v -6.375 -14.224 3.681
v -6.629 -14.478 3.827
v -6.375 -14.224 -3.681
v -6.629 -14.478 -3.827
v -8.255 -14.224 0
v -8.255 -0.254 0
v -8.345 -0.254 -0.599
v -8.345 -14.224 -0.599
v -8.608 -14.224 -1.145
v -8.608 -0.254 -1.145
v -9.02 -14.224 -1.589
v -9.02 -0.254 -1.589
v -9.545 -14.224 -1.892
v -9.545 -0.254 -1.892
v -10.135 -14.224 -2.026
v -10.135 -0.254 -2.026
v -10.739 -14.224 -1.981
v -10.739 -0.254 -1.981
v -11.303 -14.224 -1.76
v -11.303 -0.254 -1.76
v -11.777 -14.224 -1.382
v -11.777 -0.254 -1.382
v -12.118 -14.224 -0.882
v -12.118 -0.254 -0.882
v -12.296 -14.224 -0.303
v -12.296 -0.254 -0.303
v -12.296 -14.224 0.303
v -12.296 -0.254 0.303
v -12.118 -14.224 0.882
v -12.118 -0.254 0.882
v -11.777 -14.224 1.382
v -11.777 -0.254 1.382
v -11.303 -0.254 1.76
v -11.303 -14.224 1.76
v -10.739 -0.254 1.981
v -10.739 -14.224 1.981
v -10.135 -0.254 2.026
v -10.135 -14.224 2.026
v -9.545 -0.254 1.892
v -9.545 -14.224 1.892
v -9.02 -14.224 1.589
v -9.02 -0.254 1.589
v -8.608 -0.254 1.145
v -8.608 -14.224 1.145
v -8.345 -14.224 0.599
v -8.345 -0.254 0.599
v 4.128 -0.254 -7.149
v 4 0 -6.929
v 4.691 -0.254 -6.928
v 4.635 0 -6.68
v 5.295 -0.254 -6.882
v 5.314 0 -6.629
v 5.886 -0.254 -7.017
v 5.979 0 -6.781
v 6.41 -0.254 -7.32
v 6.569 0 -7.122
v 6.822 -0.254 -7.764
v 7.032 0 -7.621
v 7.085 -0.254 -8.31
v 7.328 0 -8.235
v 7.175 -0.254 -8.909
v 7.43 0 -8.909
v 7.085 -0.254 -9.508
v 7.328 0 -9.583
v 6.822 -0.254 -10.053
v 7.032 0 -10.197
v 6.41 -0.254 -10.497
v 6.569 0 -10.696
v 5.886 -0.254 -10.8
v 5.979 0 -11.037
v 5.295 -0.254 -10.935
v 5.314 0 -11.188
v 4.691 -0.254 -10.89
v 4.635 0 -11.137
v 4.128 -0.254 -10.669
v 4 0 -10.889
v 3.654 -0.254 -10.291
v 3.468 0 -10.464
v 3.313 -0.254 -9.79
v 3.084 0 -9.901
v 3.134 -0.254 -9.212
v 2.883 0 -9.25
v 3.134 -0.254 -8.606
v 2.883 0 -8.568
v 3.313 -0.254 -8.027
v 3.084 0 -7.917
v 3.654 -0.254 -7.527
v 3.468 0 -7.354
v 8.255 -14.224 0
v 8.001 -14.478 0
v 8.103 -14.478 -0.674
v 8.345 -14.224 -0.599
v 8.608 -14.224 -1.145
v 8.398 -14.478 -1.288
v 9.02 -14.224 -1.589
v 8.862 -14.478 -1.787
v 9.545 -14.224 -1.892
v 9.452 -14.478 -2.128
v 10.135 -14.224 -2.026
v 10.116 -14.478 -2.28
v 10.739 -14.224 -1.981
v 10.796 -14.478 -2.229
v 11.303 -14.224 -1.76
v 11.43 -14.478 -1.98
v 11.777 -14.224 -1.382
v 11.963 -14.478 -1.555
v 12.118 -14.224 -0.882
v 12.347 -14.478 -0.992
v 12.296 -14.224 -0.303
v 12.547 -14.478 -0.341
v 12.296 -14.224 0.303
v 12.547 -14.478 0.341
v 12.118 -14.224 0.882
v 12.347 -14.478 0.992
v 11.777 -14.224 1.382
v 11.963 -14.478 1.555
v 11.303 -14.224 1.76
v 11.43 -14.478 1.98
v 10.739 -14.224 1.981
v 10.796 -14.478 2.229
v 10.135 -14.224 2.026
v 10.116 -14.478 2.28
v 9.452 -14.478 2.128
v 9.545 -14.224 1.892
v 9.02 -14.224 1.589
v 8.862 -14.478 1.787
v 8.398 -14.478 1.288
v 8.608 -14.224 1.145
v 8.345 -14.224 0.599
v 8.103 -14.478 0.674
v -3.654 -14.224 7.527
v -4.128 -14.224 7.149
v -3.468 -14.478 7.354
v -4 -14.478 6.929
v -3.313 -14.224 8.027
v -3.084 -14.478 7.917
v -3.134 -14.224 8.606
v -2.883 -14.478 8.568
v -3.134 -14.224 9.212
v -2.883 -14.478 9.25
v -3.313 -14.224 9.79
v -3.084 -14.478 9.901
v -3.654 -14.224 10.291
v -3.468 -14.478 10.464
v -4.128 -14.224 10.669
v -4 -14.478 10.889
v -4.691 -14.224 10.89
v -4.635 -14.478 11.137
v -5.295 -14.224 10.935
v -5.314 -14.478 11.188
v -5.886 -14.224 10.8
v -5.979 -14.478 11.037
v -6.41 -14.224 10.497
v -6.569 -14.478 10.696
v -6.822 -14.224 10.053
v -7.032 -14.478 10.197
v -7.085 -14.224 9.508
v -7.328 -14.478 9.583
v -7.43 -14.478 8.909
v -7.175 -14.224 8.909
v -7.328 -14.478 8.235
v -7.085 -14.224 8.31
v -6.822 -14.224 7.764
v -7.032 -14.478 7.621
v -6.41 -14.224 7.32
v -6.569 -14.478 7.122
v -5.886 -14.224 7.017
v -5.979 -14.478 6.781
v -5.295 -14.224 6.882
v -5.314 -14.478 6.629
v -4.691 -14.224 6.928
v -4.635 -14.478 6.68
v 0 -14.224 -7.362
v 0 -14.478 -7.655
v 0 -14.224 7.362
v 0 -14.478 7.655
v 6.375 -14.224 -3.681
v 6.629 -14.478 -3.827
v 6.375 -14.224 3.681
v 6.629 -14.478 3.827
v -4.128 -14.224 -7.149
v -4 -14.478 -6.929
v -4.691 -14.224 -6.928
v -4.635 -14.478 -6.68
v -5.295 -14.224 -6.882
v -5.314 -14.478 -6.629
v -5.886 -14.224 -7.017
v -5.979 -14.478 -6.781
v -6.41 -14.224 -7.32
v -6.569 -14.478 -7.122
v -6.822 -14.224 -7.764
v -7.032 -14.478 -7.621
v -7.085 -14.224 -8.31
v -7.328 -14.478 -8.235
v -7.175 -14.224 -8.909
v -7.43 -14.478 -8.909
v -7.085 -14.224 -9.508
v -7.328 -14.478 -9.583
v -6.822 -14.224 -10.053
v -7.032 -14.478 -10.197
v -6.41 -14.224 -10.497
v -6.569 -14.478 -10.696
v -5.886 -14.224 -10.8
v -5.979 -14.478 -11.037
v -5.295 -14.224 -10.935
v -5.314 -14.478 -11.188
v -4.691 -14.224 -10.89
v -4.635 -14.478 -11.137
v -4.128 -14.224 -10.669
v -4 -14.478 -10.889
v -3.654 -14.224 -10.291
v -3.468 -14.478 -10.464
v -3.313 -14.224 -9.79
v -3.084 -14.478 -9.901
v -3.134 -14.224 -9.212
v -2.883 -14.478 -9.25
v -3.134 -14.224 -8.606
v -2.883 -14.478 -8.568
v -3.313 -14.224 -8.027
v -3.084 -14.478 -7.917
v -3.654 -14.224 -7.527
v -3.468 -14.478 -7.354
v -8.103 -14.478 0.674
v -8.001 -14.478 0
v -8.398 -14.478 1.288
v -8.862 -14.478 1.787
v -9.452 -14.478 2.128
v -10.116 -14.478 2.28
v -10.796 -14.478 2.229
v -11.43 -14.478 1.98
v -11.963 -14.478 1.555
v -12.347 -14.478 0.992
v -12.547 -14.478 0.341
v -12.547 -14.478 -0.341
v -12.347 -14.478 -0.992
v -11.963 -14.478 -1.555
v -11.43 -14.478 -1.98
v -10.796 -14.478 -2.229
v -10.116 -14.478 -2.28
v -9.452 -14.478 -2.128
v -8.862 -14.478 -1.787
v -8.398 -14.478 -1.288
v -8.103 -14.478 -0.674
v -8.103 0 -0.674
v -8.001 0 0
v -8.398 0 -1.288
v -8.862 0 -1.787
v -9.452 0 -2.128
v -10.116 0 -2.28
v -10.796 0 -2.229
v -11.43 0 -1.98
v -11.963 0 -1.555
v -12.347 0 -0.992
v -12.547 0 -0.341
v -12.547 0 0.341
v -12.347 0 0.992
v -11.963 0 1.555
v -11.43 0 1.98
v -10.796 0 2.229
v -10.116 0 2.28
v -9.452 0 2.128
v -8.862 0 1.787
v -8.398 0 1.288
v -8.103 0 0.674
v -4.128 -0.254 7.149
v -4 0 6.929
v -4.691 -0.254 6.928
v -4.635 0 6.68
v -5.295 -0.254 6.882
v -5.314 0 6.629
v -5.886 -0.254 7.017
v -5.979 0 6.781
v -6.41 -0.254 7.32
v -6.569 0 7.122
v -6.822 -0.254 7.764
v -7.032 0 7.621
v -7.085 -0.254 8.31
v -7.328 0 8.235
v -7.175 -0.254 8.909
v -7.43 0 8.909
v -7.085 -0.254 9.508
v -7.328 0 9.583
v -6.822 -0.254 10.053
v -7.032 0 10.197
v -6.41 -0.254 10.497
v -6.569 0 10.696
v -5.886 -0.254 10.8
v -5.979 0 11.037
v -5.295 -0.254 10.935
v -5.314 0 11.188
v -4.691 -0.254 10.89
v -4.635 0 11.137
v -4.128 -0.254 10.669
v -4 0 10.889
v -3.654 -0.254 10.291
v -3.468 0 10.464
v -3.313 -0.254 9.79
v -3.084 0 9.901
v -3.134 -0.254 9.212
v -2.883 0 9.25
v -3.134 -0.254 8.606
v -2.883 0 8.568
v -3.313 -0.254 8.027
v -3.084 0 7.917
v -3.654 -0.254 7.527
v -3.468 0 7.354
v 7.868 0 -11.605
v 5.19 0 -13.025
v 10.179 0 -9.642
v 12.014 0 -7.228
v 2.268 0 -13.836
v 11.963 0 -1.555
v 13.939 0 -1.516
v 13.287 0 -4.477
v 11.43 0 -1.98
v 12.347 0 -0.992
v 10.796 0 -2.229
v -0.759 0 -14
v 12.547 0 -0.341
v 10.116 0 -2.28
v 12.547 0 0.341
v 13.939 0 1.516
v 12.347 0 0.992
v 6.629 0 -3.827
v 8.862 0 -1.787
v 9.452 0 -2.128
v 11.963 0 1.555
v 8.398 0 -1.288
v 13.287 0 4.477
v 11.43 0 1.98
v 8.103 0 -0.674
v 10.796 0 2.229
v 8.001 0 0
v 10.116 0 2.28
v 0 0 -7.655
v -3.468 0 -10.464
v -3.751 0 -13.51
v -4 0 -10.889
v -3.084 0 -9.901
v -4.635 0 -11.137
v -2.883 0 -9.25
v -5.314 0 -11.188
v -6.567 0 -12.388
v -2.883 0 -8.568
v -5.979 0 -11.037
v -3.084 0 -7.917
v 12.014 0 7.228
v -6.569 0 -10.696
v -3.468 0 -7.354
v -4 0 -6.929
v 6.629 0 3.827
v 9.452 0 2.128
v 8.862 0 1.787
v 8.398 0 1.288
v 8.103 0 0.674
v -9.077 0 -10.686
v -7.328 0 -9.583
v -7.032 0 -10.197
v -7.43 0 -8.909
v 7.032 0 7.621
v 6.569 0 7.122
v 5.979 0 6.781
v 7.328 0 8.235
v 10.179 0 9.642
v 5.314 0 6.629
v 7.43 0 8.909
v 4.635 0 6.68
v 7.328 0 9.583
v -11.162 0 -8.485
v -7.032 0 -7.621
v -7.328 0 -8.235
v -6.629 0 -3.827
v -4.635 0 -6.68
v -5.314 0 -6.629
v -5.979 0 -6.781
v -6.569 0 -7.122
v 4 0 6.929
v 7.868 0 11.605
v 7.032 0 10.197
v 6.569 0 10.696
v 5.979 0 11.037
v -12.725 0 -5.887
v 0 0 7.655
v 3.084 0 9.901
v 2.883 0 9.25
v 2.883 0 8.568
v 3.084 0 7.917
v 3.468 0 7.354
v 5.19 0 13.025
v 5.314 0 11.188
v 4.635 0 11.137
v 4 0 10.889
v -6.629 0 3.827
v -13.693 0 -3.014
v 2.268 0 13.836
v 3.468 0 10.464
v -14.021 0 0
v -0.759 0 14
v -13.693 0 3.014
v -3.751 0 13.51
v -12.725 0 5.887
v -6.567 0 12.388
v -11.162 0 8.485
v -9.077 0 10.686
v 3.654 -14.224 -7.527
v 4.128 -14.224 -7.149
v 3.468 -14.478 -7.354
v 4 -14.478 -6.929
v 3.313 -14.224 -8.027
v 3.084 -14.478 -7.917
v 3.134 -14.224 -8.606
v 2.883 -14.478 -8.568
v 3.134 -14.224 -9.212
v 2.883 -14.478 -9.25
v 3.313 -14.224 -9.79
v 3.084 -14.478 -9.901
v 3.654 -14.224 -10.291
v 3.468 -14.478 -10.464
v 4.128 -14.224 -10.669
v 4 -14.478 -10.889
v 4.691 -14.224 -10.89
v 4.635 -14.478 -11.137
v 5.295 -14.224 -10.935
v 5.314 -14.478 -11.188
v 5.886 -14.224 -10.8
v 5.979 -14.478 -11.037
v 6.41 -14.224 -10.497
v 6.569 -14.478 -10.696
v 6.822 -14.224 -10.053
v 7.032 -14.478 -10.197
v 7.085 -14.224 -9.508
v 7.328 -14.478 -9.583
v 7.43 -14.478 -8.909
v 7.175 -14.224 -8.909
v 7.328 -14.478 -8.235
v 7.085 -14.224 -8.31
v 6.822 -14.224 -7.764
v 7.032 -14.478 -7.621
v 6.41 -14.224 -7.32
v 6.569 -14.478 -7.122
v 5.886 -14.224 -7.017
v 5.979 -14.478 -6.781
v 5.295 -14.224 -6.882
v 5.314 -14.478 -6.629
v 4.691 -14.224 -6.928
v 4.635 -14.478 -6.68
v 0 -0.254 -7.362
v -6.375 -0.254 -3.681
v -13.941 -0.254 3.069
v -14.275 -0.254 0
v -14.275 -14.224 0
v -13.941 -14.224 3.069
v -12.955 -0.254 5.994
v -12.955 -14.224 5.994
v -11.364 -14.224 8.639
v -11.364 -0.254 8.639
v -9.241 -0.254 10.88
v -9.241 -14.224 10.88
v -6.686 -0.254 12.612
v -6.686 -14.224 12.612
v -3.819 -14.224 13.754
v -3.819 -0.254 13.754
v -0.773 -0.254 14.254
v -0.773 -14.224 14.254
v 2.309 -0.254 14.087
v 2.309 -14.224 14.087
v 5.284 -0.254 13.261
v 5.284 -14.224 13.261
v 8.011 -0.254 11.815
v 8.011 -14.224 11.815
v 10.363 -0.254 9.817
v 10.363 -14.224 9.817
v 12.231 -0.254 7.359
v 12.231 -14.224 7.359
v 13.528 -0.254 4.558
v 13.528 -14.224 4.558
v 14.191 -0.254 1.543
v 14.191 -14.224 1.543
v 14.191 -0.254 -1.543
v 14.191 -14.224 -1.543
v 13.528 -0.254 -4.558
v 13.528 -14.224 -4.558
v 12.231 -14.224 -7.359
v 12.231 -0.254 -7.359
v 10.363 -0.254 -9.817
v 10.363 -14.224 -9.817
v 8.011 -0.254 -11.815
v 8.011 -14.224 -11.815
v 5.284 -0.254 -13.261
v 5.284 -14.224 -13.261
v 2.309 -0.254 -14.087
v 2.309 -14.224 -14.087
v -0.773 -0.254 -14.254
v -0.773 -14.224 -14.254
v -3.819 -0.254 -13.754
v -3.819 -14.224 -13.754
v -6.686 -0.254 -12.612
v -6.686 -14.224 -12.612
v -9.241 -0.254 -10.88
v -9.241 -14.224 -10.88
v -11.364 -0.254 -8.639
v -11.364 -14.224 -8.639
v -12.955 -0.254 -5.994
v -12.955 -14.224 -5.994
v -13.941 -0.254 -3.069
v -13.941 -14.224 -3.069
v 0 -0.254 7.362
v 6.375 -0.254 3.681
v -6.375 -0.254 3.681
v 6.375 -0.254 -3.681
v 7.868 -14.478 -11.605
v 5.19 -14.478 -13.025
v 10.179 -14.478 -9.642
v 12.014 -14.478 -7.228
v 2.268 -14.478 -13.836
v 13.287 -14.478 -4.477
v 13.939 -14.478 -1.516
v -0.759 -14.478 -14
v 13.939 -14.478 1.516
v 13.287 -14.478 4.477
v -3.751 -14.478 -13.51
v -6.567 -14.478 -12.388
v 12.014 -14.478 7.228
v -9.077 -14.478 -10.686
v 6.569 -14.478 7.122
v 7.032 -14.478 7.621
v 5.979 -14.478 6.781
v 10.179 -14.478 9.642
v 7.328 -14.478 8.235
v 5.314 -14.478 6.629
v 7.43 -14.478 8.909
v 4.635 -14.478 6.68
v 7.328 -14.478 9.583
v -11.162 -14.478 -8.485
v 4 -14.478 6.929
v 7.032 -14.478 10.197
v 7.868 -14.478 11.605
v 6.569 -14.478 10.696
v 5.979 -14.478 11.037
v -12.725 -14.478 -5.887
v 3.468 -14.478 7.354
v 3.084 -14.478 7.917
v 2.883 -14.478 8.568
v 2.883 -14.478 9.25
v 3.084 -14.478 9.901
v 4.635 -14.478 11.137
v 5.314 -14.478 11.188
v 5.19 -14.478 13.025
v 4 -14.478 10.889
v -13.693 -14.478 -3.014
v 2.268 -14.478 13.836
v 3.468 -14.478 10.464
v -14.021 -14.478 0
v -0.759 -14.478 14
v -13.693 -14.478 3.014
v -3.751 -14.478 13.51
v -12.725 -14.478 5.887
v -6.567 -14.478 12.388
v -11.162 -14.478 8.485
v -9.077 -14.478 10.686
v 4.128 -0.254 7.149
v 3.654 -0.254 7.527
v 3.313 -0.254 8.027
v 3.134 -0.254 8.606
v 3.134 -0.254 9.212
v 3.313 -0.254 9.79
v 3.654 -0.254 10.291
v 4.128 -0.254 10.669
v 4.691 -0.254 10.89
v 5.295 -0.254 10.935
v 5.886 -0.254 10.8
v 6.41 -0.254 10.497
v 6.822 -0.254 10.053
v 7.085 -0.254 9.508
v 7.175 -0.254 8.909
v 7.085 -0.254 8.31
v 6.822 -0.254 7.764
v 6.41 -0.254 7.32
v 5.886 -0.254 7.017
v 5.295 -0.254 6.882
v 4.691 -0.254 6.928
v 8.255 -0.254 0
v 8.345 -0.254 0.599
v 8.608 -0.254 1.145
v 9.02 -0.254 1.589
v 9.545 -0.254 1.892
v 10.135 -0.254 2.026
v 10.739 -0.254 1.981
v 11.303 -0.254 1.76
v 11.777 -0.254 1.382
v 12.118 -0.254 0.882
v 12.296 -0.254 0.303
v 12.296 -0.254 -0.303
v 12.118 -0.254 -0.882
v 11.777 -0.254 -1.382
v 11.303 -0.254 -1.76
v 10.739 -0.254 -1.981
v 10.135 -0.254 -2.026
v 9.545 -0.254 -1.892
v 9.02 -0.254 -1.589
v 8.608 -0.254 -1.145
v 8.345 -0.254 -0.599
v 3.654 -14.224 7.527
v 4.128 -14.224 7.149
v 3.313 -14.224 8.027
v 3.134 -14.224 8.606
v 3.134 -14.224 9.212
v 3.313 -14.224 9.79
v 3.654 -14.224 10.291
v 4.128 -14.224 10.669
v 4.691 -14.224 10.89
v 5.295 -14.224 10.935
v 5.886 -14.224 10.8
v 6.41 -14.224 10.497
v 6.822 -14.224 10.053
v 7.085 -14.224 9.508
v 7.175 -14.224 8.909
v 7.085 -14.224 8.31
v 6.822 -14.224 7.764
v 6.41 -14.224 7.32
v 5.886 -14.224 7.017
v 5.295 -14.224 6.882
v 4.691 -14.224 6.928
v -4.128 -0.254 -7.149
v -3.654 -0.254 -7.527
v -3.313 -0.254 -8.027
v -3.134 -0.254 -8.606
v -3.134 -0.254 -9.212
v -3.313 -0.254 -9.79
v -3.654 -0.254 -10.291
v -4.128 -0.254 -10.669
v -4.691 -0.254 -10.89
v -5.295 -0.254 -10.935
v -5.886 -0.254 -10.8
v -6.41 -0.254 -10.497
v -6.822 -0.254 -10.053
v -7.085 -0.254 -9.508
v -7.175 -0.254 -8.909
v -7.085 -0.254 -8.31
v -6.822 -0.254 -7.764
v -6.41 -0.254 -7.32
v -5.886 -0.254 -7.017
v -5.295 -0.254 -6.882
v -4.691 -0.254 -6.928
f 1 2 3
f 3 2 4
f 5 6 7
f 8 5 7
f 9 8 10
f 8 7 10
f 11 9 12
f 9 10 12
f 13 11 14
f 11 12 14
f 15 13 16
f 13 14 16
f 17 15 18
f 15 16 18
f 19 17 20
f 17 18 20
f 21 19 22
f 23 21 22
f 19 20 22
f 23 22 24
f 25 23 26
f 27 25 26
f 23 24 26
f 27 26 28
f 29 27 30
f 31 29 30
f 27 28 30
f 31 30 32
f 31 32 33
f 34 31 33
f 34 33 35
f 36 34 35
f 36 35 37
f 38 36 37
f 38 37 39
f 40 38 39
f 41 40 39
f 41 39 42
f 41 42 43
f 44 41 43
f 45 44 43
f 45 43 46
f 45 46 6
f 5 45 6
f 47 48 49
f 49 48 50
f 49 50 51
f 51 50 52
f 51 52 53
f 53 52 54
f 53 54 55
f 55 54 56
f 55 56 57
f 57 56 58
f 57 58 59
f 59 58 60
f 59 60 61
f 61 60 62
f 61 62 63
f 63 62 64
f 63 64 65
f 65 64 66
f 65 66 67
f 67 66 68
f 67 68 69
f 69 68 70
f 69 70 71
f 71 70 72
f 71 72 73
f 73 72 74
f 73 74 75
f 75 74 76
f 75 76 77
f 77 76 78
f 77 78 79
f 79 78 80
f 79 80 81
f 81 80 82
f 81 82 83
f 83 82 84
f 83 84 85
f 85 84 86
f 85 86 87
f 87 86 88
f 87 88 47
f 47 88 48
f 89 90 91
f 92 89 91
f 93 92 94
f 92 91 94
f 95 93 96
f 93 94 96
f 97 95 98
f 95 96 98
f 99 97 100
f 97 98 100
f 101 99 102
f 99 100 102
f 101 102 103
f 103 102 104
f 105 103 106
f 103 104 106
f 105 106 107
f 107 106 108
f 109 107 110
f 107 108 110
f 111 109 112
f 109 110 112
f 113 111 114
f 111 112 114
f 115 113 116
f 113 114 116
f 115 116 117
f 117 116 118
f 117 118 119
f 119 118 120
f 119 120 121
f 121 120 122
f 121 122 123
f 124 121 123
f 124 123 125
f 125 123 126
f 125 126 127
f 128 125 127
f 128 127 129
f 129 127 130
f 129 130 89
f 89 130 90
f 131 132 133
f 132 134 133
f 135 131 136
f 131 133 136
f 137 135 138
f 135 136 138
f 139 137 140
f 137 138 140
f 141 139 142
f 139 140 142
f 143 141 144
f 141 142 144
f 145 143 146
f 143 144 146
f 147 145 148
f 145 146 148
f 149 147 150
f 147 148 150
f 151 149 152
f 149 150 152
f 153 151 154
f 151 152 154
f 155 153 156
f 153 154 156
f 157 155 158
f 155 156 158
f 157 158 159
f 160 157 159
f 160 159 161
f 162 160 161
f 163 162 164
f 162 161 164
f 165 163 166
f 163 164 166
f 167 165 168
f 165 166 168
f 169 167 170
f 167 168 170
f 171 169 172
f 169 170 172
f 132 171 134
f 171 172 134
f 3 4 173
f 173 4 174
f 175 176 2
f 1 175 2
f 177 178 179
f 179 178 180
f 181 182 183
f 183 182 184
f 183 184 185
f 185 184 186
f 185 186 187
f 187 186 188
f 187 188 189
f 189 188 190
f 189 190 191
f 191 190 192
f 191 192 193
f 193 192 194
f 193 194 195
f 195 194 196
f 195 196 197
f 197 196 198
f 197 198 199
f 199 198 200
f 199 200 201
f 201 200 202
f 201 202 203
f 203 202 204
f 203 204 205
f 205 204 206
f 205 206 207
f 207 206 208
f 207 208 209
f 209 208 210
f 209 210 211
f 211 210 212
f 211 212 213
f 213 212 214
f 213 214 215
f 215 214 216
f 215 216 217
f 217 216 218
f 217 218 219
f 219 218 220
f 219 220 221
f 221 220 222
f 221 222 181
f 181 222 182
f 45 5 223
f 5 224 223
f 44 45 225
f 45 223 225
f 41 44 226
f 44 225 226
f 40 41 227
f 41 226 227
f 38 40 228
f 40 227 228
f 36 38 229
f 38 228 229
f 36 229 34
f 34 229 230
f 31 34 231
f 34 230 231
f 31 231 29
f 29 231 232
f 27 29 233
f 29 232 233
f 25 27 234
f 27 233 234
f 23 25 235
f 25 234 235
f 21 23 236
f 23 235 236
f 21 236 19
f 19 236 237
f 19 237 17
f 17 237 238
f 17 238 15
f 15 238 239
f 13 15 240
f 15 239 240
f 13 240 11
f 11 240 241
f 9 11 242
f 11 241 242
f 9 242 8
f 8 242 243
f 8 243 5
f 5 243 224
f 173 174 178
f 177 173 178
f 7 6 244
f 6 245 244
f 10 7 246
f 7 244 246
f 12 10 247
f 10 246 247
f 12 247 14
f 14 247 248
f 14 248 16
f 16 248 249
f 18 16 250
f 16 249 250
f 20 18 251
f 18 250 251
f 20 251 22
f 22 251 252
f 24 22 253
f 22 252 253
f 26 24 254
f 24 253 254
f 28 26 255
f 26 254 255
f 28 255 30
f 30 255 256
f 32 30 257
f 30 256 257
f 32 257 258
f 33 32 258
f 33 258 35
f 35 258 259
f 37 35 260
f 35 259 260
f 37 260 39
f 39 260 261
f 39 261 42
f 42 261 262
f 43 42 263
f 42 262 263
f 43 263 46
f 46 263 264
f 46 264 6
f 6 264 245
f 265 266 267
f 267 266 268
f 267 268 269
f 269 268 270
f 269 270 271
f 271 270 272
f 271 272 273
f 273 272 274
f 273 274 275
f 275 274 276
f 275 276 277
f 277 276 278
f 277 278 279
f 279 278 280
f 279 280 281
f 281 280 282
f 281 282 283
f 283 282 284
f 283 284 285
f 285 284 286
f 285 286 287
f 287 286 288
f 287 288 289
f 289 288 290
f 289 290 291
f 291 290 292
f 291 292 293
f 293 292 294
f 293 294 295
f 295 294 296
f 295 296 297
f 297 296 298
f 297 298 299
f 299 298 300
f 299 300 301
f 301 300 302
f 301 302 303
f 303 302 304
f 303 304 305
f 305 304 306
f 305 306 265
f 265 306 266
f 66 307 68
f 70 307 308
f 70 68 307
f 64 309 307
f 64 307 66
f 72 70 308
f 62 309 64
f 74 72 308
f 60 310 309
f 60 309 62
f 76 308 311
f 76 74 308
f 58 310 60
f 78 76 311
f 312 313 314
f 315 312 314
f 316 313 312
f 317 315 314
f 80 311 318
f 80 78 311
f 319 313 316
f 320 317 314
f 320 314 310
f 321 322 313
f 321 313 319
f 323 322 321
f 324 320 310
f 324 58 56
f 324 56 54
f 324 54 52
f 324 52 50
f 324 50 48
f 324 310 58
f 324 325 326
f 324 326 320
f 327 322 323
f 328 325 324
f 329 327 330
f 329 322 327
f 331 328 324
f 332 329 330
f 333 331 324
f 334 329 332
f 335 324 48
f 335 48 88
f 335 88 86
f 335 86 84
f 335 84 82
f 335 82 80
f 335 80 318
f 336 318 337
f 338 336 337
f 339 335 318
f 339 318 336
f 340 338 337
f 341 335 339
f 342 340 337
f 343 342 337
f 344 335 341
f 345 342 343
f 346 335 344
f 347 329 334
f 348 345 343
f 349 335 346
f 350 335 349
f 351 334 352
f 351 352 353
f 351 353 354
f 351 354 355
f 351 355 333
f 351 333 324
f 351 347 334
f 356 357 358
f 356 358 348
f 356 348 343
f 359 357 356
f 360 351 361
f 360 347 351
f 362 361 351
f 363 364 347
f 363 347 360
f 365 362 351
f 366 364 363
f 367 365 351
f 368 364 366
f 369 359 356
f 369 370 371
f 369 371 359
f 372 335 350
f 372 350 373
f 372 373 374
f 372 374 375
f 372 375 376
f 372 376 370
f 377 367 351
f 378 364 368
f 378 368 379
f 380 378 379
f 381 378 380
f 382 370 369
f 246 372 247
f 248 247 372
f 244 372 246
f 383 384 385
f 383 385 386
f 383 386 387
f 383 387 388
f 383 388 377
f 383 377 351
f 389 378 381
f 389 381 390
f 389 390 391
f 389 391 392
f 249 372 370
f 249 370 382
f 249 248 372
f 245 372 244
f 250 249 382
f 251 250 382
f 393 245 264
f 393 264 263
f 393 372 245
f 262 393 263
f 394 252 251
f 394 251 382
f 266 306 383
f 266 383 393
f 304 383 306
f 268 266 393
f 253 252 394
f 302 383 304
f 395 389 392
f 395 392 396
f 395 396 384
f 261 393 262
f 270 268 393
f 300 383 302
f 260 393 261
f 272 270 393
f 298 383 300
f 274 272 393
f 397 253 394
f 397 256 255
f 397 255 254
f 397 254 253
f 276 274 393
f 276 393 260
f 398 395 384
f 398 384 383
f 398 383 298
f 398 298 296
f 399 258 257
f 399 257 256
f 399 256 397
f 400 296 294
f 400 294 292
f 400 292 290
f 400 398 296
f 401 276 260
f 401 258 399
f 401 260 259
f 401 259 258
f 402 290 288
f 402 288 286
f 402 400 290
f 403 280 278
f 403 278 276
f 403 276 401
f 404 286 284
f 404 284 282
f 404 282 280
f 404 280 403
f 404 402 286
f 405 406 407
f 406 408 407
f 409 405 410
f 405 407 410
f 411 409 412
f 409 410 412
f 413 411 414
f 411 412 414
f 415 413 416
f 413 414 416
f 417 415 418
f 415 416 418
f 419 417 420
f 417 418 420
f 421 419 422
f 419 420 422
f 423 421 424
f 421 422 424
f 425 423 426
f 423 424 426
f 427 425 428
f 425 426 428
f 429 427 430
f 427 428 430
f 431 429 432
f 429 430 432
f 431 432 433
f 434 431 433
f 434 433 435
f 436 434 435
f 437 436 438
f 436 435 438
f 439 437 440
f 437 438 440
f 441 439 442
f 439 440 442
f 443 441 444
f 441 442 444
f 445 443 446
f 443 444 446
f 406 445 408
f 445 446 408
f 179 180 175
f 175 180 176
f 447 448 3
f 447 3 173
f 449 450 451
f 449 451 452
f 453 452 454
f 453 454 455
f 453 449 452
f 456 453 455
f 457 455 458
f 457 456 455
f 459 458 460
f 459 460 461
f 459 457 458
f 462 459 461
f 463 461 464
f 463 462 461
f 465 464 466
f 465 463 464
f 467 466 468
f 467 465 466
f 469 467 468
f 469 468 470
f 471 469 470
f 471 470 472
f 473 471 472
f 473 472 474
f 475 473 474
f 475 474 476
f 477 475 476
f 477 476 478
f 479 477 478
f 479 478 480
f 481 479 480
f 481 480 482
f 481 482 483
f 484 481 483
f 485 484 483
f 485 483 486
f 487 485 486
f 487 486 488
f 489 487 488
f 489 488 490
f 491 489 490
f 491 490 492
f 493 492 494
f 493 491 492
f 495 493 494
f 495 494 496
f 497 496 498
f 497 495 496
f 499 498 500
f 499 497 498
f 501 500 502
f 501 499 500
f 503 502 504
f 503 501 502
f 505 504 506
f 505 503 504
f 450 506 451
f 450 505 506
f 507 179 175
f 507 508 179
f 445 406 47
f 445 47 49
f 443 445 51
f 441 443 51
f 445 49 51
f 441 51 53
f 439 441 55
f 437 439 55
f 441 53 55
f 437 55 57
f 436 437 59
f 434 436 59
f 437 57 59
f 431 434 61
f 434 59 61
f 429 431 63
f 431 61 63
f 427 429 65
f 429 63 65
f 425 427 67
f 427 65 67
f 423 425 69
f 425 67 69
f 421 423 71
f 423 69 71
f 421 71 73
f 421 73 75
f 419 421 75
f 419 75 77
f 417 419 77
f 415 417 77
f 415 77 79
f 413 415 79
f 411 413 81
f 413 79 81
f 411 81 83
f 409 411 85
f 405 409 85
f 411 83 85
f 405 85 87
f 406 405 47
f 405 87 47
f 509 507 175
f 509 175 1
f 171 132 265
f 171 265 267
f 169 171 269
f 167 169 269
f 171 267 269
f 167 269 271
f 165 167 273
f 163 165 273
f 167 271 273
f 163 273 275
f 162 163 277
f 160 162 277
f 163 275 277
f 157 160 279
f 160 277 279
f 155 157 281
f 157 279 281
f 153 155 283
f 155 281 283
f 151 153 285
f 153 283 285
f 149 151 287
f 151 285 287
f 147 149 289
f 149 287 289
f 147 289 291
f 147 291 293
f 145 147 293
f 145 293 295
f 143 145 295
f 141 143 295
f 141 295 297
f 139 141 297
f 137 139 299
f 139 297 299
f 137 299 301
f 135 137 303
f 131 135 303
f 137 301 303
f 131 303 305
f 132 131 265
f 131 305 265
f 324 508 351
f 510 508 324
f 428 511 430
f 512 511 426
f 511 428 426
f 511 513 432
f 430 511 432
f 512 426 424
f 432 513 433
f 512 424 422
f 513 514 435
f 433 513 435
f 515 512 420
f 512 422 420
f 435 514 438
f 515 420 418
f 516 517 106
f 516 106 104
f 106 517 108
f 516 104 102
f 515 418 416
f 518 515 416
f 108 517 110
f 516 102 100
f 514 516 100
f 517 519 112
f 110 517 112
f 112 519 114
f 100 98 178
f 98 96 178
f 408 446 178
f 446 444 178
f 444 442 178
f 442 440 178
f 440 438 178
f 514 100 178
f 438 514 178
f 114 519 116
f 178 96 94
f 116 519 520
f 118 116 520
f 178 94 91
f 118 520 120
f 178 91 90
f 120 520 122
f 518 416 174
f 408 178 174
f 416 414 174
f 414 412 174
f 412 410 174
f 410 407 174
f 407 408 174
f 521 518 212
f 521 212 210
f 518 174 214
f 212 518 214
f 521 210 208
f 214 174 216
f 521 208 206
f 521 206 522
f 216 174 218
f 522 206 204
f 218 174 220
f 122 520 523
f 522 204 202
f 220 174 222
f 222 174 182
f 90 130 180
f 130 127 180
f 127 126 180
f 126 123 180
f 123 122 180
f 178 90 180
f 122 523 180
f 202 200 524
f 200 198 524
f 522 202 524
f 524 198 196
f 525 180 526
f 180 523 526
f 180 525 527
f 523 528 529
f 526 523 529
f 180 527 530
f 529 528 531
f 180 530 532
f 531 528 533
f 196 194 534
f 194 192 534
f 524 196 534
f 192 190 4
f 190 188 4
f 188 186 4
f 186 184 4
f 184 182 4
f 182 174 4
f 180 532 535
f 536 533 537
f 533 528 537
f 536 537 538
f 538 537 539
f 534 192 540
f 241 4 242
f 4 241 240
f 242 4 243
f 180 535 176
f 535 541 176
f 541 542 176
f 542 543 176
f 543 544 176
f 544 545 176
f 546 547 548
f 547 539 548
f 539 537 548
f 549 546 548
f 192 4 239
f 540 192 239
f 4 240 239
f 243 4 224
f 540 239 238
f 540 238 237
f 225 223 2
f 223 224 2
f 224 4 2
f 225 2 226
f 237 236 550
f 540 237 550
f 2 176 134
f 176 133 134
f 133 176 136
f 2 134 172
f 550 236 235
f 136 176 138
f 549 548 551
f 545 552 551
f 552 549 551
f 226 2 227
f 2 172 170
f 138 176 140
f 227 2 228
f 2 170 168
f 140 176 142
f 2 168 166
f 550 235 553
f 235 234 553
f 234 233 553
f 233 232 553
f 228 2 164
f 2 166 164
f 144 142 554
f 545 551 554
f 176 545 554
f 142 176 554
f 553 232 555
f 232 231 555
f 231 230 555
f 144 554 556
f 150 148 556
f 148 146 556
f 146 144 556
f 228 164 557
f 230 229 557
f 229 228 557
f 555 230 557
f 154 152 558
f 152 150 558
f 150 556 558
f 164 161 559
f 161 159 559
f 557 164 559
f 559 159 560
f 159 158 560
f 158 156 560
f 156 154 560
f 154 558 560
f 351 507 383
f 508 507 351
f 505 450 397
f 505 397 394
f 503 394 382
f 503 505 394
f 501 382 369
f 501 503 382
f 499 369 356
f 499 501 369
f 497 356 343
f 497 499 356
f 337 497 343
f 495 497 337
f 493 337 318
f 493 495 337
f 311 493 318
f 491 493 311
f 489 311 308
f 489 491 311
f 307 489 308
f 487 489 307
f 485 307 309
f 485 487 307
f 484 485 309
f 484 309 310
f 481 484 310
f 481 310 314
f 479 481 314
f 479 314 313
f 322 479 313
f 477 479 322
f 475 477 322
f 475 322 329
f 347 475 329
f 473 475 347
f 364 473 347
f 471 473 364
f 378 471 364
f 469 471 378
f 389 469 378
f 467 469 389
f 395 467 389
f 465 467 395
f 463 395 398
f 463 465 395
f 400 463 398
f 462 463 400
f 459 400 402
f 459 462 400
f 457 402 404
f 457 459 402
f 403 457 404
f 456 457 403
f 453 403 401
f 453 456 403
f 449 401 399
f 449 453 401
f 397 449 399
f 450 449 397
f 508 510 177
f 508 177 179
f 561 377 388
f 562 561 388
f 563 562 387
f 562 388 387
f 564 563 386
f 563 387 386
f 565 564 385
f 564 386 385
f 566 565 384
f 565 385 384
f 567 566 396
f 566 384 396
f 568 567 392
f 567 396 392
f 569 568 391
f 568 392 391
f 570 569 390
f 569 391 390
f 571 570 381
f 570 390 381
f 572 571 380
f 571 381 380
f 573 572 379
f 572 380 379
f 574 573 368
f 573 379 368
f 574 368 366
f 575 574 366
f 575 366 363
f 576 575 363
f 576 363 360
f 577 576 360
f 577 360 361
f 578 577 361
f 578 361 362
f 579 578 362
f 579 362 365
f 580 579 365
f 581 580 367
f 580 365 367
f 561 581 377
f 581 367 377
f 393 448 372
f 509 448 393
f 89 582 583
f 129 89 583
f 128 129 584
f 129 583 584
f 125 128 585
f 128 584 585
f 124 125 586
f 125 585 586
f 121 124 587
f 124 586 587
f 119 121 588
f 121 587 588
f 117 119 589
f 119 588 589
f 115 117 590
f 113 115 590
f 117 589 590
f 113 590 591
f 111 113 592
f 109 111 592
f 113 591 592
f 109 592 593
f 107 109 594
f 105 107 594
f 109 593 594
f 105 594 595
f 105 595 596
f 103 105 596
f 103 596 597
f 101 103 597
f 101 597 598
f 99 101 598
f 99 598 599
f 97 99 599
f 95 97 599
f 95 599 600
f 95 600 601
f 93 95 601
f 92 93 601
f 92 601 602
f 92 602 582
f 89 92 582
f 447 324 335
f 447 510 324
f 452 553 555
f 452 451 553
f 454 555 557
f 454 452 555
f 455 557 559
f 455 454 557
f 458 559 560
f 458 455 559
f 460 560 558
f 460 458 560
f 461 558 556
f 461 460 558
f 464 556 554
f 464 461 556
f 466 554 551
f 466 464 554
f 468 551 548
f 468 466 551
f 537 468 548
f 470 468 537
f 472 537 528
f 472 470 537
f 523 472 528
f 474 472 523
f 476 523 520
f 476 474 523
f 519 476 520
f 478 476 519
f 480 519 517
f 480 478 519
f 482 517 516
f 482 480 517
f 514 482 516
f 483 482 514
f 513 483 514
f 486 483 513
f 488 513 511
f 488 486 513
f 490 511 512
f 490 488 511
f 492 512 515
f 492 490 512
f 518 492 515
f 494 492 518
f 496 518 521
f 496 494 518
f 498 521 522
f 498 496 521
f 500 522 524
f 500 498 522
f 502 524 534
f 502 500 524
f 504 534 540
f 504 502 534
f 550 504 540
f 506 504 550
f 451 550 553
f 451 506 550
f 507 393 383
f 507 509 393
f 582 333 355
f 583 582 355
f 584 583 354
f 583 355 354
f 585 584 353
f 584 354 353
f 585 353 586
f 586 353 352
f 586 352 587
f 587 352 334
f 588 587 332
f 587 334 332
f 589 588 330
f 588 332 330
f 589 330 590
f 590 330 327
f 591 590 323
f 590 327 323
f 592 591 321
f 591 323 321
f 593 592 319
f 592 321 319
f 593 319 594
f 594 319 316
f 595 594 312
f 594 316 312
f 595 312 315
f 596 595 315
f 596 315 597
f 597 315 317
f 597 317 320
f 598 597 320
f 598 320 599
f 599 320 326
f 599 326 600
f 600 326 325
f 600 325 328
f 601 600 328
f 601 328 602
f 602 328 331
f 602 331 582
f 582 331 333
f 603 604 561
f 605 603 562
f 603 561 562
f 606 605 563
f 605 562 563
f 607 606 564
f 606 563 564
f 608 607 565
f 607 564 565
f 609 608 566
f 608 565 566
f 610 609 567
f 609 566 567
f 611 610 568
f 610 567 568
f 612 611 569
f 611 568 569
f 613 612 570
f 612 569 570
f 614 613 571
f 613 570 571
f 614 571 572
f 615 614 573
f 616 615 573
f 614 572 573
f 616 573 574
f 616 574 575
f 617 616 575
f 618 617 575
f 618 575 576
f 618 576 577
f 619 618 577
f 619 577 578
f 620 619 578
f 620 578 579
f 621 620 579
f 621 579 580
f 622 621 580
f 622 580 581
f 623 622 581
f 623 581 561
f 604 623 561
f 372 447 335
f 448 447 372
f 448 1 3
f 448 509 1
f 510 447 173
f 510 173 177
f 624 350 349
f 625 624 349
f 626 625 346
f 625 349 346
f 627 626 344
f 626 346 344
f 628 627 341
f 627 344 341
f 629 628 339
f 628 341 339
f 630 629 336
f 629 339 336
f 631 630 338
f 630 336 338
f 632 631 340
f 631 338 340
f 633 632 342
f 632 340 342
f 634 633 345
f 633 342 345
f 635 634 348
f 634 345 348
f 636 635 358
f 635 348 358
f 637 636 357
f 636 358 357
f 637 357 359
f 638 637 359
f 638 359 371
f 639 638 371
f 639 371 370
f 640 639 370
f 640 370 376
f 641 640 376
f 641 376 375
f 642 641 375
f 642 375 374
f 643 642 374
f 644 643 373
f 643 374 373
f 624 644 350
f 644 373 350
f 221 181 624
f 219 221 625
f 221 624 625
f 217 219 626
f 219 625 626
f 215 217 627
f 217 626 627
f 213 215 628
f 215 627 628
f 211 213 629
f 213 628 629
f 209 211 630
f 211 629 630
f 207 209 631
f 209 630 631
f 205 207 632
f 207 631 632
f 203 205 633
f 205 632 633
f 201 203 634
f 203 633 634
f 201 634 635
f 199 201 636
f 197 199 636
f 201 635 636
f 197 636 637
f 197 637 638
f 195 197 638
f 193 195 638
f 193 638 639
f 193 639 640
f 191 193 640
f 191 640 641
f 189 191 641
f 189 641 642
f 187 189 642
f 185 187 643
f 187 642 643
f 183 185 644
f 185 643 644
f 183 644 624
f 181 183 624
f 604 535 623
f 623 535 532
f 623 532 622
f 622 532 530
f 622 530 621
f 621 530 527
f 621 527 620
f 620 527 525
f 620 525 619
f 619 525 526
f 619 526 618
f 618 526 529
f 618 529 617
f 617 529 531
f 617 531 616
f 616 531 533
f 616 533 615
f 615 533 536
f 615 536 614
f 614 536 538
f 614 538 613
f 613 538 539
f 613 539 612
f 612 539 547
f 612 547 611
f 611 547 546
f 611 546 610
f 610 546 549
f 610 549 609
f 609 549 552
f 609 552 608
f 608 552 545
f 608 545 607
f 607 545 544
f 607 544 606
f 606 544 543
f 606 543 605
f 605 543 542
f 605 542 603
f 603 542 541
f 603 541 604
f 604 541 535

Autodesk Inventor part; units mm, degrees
ref_plane "YZ Plane" through (0, 0, 0) normal (1, 0, 0) x (0, 1, 0)
ref_plane "XZ Plane" through (0, 0, 0) normal (0, 1, 0) x (-1, 0, 0)
ref_plane "XY Plane" through (0, 0, 0) normal (0, 0, 1) x (1, 0, 0)
sketch "Sketch1" plane through (0, 0, 0) normal (0, 1, 0) x (-1, 0, 0)
  circle A0 centre (0, 0) radius 14.2748
  dimension "d0" = 28.5496
extrude "Extrusion1" add sketch "Sketch1" against normal blind 14.478
sketch "Sketch2" plane through (0, 0, 0) normal (0, 1, 0) x (1, 0, 0)
  circle A0 centre (0, 0) radius 10.287
  circle A1 centre (-10.287, 0) radius 2.032
  dimension "d3" = 20.574
  dimension "d4" = 4.064
extrude "Extrusion2" cut sketch "Sketch2" against normal up to next contours A1 A0 | A0 A1 picked at (-9.5948, 0) picked at (-10.9494, 0)
chamfer "Chamfer1" distance 0.254 angle 45 2 edges at (-12.319, 0, 0) (-12.319, -14.478, 0)
pattern_circular "Circular Pattern1" count 6 over 360 about axis through (0, 0, 0) along (0, -1, 0) of "Extrusion2", "Chamfer1"
chamfer "Chamfer2" distance 0.254 angle 45 2 edges at (14.2748, 0, 0) (14.2748, -14.478, 0)
sketch "Sketch3" plane through (0, 0, 0) normal (0, 1, 0) x (1, 0, 0)
  line L0 (-6.3754, 3.6808) -> (0, 7.3617)
  line L1 (0, 7.3617) -> (6.3754, 3.6808)
  line L2 (6.3754, 3.6808) -> (6.3754, -3.6808)
  line L3 (6.3754, -3.6808) -> (0, -7.3617)
  line L4 (0, -7.3617) -> (-6.3754, -3.6808)
  line L5 (-6.3754, -3.6808) -> (-6.3754, 3.6808)
  point P0 (0, 0)
  point P1 (0, 0)
  dimension "d16" = 12.7508
extrude "Extrusion3" cut sketch "Sketch3" against normal up to next
chamfer "Chamfer3" distance 0.254 angle 45 12 edges at (-6.3754, 0, 0) (-3.1877, 0, -5.5213) (3.1877, 0, -5.5213) (6.3754, 0, 0) (3.1877, 0, 5.5213) (-3.1877, 0, 5.5213) (3.1877, -14.478, 5.5213) (6.3754, -14.478, 0) (3.1877, -14.478, -5.5213) (-3.1877, -14.478, -5.5213) (-6.3754, -14.478, 0) (-3.1877, -14.478, 5.5213)
properties part number "am-1305" material "Polypropylene"
